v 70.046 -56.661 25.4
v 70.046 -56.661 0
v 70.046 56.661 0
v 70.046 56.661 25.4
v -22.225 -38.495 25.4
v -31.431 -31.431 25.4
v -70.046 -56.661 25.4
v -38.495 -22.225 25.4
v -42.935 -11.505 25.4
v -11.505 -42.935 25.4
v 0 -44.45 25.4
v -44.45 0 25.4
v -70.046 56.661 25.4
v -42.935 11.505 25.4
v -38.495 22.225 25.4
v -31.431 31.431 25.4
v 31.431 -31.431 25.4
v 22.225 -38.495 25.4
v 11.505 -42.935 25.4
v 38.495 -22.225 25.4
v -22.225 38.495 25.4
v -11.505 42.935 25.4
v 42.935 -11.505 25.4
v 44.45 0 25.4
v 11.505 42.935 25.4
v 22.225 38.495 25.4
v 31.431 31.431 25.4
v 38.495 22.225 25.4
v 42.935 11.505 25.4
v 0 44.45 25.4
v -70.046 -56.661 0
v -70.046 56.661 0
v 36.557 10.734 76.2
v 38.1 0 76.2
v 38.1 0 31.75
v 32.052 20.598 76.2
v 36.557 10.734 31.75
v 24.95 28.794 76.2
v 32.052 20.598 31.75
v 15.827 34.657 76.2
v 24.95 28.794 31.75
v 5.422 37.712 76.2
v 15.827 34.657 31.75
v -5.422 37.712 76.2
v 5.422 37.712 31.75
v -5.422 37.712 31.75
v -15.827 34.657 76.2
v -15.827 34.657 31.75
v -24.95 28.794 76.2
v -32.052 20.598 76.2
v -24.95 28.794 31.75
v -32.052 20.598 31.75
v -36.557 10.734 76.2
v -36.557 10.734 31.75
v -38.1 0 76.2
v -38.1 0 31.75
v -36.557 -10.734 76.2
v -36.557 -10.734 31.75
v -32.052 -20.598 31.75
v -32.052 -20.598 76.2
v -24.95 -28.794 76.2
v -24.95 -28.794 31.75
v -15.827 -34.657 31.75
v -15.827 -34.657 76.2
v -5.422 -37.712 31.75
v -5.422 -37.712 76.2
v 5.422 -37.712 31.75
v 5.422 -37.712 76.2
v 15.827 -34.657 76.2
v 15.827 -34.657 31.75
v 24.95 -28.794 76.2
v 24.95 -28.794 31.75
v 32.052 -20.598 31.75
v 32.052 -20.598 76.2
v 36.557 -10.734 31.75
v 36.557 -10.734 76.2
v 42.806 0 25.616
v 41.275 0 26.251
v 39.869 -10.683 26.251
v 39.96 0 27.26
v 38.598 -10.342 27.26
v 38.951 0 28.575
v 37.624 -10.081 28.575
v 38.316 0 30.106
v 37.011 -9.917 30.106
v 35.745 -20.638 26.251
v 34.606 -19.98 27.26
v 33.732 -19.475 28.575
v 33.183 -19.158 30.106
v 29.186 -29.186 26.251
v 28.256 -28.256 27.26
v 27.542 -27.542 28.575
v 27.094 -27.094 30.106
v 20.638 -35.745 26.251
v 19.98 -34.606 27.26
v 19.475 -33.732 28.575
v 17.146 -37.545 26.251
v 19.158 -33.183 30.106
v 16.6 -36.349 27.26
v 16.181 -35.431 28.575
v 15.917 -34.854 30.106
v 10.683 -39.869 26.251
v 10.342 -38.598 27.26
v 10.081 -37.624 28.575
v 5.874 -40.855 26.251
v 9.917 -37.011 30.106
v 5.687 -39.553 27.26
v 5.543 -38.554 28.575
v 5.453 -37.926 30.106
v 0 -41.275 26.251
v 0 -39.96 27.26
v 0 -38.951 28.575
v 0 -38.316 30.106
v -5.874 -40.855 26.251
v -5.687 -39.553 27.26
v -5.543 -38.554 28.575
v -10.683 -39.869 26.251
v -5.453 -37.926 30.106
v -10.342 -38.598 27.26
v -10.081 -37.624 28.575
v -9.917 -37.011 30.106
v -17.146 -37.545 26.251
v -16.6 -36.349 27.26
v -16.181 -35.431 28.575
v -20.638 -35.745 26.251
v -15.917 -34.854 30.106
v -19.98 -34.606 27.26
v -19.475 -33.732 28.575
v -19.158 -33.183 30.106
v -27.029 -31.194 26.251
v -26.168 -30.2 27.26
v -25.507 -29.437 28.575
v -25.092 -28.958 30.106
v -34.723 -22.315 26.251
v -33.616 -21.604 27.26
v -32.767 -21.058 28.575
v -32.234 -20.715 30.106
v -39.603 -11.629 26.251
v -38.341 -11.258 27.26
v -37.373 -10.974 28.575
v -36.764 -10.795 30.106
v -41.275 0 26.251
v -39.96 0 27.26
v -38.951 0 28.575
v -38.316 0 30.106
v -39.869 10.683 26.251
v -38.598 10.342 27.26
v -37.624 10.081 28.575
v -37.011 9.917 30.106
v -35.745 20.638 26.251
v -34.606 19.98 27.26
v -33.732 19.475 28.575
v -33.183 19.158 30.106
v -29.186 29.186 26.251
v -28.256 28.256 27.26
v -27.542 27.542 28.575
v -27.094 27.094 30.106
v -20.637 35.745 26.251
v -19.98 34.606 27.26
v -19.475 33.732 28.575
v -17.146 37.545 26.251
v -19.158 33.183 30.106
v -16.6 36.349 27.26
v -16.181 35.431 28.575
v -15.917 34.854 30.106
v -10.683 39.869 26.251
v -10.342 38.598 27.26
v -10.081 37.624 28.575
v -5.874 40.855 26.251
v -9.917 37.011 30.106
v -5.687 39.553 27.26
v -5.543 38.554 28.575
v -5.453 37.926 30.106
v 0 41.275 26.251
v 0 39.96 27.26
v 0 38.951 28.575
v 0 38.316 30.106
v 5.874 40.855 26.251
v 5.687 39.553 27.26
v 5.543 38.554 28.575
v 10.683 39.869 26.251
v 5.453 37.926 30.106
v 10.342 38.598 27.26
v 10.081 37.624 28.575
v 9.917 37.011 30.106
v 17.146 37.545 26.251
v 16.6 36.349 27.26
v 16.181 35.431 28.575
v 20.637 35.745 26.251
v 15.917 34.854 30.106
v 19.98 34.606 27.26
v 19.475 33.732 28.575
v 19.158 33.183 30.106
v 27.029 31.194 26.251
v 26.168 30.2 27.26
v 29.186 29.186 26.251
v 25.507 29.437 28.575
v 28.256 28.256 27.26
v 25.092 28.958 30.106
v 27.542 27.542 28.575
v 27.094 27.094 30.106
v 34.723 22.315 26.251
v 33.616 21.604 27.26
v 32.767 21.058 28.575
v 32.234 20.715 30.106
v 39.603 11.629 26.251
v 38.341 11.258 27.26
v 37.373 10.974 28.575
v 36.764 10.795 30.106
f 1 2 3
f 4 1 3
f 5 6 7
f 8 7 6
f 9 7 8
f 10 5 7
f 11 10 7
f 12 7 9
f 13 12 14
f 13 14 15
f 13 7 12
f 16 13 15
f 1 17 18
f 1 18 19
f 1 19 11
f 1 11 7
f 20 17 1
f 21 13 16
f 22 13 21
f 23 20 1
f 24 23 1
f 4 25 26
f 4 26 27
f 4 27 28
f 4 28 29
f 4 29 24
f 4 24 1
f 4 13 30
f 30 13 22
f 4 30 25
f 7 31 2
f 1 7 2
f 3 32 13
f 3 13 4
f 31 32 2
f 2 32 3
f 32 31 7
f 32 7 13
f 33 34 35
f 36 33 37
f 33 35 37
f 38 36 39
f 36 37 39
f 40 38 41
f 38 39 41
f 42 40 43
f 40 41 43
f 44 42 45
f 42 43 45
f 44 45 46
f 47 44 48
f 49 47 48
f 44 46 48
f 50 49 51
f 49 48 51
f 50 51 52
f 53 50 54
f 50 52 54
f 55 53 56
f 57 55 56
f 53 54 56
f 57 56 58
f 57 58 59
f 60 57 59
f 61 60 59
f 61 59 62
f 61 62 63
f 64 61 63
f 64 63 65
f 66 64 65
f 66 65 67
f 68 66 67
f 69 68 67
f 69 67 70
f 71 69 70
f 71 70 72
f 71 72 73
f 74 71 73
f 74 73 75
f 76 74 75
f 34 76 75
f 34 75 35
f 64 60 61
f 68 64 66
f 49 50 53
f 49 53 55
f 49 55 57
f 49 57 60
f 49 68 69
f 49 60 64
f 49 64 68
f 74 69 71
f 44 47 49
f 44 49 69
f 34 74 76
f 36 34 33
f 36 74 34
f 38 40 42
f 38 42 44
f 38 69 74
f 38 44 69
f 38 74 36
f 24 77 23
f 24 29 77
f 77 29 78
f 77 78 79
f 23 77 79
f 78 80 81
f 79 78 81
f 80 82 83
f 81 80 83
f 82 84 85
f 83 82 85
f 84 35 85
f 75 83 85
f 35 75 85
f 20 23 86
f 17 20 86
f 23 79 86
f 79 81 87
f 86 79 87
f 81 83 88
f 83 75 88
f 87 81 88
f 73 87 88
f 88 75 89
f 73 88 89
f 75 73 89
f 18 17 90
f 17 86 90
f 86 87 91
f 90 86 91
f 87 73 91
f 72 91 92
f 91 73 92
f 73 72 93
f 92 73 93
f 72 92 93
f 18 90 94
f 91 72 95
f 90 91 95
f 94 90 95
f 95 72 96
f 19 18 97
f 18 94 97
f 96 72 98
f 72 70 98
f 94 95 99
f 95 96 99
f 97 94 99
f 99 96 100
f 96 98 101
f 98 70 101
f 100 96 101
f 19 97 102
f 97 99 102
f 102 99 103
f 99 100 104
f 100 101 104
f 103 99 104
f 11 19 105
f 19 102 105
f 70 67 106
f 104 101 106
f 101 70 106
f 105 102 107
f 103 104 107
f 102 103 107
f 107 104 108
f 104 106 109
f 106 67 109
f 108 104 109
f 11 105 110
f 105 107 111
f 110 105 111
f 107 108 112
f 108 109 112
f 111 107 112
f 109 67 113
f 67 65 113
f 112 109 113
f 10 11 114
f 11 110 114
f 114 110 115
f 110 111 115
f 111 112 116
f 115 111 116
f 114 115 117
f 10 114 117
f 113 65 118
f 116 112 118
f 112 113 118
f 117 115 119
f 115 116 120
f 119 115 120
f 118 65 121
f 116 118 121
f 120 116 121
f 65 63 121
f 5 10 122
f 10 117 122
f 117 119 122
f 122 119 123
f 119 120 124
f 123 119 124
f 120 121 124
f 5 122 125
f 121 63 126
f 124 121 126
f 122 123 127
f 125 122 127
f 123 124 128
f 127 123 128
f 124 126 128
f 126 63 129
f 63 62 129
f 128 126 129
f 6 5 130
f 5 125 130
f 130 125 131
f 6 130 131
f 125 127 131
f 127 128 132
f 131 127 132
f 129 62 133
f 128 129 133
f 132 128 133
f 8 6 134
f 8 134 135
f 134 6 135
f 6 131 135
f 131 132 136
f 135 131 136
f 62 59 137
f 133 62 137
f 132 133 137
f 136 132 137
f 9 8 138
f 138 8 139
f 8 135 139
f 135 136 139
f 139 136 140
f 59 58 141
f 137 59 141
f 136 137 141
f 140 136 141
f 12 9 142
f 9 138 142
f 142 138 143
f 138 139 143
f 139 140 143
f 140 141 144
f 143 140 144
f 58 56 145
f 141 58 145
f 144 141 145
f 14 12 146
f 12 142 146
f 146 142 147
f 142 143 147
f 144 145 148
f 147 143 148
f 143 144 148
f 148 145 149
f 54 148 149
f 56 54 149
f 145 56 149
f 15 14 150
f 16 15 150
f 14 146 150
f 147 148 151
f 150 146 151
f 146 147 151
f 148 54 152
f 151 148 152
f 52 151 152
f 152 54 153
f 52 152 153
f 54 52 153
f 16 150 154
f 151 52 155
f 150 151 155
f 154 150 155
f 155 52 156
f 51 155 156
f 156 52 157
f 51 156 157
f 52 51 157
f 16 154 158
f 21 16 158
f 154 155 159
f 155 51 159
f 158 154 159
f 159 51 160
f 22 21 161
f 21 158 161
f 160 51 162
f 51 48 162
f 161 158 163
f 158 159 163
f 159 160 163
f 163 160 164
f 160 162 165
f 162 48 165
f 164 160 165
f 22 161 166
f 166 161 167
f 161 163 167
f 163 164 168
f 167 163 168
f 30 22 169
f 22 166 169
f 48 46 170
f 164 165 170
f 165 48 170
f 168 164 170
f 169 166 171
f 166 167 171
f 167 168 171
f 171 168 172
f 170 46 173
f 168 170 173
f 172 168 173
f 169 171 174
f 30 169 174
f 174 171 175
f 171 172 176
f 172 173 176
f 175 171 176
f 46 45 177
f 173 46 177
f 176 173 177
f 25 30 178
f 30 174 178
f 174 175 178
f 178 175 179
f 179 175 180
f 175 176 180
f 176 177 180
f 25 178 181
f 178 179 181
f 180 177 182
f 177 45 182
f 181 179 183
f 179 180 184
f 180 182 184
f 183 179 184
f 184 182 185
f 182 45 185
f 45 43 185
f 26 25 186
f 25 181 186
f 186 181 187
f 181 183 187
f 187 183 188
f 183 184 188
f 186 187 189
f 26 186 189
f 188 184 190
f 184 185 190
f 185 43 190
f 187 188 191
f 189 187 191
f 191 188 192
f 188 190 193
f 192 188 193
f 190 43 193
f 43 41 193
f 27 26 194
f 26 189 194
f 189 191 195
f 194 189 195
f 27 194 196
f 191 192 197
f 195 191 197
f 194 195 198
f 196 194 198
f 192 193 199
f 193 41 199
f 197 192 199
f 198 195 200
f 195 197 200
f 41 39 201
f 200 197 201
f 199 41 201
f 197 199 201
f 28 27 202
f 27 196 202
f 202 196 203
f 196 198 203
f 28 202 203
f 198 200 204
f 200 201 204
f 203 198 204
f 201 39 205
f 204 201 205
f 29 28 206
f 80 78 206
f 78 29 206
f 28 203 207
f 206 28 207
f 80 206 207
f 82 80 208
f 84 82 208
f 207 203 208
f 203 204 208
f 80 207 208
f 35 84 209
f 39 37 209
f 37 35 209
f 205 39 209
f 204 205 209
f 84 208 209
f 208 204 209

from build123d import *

# Parameters (mm, degrees)
F0_R     = 38.1
F1_DEPTH = 76.2
F2_W     = 140.091866
F2_H     = 113.32272
F3_DEPTH = 25.4
F4_R     = 6.35


with BuildPart() as f1:
    # F0 (on Top) → F1 (new body)
    with BuildSketch(Plane.XY):
        Circle(F0_R)
    extrude(amount=F1_DEPTH)

    # F2 (on Top) → F3 (join)
    with BuildSketch(Plane.XY):
        Rectangle(F2_W, F2_H)
    extrude(amount=F3_DEPTH)

    # F4
    f4_edges = [f1.edges().sort_by_distance(p)[0] for p in [
        (-38.1, 0, 25.4),
    ]]
    fillet(f4_edges, radius=F4_R)


solid = f1.part
